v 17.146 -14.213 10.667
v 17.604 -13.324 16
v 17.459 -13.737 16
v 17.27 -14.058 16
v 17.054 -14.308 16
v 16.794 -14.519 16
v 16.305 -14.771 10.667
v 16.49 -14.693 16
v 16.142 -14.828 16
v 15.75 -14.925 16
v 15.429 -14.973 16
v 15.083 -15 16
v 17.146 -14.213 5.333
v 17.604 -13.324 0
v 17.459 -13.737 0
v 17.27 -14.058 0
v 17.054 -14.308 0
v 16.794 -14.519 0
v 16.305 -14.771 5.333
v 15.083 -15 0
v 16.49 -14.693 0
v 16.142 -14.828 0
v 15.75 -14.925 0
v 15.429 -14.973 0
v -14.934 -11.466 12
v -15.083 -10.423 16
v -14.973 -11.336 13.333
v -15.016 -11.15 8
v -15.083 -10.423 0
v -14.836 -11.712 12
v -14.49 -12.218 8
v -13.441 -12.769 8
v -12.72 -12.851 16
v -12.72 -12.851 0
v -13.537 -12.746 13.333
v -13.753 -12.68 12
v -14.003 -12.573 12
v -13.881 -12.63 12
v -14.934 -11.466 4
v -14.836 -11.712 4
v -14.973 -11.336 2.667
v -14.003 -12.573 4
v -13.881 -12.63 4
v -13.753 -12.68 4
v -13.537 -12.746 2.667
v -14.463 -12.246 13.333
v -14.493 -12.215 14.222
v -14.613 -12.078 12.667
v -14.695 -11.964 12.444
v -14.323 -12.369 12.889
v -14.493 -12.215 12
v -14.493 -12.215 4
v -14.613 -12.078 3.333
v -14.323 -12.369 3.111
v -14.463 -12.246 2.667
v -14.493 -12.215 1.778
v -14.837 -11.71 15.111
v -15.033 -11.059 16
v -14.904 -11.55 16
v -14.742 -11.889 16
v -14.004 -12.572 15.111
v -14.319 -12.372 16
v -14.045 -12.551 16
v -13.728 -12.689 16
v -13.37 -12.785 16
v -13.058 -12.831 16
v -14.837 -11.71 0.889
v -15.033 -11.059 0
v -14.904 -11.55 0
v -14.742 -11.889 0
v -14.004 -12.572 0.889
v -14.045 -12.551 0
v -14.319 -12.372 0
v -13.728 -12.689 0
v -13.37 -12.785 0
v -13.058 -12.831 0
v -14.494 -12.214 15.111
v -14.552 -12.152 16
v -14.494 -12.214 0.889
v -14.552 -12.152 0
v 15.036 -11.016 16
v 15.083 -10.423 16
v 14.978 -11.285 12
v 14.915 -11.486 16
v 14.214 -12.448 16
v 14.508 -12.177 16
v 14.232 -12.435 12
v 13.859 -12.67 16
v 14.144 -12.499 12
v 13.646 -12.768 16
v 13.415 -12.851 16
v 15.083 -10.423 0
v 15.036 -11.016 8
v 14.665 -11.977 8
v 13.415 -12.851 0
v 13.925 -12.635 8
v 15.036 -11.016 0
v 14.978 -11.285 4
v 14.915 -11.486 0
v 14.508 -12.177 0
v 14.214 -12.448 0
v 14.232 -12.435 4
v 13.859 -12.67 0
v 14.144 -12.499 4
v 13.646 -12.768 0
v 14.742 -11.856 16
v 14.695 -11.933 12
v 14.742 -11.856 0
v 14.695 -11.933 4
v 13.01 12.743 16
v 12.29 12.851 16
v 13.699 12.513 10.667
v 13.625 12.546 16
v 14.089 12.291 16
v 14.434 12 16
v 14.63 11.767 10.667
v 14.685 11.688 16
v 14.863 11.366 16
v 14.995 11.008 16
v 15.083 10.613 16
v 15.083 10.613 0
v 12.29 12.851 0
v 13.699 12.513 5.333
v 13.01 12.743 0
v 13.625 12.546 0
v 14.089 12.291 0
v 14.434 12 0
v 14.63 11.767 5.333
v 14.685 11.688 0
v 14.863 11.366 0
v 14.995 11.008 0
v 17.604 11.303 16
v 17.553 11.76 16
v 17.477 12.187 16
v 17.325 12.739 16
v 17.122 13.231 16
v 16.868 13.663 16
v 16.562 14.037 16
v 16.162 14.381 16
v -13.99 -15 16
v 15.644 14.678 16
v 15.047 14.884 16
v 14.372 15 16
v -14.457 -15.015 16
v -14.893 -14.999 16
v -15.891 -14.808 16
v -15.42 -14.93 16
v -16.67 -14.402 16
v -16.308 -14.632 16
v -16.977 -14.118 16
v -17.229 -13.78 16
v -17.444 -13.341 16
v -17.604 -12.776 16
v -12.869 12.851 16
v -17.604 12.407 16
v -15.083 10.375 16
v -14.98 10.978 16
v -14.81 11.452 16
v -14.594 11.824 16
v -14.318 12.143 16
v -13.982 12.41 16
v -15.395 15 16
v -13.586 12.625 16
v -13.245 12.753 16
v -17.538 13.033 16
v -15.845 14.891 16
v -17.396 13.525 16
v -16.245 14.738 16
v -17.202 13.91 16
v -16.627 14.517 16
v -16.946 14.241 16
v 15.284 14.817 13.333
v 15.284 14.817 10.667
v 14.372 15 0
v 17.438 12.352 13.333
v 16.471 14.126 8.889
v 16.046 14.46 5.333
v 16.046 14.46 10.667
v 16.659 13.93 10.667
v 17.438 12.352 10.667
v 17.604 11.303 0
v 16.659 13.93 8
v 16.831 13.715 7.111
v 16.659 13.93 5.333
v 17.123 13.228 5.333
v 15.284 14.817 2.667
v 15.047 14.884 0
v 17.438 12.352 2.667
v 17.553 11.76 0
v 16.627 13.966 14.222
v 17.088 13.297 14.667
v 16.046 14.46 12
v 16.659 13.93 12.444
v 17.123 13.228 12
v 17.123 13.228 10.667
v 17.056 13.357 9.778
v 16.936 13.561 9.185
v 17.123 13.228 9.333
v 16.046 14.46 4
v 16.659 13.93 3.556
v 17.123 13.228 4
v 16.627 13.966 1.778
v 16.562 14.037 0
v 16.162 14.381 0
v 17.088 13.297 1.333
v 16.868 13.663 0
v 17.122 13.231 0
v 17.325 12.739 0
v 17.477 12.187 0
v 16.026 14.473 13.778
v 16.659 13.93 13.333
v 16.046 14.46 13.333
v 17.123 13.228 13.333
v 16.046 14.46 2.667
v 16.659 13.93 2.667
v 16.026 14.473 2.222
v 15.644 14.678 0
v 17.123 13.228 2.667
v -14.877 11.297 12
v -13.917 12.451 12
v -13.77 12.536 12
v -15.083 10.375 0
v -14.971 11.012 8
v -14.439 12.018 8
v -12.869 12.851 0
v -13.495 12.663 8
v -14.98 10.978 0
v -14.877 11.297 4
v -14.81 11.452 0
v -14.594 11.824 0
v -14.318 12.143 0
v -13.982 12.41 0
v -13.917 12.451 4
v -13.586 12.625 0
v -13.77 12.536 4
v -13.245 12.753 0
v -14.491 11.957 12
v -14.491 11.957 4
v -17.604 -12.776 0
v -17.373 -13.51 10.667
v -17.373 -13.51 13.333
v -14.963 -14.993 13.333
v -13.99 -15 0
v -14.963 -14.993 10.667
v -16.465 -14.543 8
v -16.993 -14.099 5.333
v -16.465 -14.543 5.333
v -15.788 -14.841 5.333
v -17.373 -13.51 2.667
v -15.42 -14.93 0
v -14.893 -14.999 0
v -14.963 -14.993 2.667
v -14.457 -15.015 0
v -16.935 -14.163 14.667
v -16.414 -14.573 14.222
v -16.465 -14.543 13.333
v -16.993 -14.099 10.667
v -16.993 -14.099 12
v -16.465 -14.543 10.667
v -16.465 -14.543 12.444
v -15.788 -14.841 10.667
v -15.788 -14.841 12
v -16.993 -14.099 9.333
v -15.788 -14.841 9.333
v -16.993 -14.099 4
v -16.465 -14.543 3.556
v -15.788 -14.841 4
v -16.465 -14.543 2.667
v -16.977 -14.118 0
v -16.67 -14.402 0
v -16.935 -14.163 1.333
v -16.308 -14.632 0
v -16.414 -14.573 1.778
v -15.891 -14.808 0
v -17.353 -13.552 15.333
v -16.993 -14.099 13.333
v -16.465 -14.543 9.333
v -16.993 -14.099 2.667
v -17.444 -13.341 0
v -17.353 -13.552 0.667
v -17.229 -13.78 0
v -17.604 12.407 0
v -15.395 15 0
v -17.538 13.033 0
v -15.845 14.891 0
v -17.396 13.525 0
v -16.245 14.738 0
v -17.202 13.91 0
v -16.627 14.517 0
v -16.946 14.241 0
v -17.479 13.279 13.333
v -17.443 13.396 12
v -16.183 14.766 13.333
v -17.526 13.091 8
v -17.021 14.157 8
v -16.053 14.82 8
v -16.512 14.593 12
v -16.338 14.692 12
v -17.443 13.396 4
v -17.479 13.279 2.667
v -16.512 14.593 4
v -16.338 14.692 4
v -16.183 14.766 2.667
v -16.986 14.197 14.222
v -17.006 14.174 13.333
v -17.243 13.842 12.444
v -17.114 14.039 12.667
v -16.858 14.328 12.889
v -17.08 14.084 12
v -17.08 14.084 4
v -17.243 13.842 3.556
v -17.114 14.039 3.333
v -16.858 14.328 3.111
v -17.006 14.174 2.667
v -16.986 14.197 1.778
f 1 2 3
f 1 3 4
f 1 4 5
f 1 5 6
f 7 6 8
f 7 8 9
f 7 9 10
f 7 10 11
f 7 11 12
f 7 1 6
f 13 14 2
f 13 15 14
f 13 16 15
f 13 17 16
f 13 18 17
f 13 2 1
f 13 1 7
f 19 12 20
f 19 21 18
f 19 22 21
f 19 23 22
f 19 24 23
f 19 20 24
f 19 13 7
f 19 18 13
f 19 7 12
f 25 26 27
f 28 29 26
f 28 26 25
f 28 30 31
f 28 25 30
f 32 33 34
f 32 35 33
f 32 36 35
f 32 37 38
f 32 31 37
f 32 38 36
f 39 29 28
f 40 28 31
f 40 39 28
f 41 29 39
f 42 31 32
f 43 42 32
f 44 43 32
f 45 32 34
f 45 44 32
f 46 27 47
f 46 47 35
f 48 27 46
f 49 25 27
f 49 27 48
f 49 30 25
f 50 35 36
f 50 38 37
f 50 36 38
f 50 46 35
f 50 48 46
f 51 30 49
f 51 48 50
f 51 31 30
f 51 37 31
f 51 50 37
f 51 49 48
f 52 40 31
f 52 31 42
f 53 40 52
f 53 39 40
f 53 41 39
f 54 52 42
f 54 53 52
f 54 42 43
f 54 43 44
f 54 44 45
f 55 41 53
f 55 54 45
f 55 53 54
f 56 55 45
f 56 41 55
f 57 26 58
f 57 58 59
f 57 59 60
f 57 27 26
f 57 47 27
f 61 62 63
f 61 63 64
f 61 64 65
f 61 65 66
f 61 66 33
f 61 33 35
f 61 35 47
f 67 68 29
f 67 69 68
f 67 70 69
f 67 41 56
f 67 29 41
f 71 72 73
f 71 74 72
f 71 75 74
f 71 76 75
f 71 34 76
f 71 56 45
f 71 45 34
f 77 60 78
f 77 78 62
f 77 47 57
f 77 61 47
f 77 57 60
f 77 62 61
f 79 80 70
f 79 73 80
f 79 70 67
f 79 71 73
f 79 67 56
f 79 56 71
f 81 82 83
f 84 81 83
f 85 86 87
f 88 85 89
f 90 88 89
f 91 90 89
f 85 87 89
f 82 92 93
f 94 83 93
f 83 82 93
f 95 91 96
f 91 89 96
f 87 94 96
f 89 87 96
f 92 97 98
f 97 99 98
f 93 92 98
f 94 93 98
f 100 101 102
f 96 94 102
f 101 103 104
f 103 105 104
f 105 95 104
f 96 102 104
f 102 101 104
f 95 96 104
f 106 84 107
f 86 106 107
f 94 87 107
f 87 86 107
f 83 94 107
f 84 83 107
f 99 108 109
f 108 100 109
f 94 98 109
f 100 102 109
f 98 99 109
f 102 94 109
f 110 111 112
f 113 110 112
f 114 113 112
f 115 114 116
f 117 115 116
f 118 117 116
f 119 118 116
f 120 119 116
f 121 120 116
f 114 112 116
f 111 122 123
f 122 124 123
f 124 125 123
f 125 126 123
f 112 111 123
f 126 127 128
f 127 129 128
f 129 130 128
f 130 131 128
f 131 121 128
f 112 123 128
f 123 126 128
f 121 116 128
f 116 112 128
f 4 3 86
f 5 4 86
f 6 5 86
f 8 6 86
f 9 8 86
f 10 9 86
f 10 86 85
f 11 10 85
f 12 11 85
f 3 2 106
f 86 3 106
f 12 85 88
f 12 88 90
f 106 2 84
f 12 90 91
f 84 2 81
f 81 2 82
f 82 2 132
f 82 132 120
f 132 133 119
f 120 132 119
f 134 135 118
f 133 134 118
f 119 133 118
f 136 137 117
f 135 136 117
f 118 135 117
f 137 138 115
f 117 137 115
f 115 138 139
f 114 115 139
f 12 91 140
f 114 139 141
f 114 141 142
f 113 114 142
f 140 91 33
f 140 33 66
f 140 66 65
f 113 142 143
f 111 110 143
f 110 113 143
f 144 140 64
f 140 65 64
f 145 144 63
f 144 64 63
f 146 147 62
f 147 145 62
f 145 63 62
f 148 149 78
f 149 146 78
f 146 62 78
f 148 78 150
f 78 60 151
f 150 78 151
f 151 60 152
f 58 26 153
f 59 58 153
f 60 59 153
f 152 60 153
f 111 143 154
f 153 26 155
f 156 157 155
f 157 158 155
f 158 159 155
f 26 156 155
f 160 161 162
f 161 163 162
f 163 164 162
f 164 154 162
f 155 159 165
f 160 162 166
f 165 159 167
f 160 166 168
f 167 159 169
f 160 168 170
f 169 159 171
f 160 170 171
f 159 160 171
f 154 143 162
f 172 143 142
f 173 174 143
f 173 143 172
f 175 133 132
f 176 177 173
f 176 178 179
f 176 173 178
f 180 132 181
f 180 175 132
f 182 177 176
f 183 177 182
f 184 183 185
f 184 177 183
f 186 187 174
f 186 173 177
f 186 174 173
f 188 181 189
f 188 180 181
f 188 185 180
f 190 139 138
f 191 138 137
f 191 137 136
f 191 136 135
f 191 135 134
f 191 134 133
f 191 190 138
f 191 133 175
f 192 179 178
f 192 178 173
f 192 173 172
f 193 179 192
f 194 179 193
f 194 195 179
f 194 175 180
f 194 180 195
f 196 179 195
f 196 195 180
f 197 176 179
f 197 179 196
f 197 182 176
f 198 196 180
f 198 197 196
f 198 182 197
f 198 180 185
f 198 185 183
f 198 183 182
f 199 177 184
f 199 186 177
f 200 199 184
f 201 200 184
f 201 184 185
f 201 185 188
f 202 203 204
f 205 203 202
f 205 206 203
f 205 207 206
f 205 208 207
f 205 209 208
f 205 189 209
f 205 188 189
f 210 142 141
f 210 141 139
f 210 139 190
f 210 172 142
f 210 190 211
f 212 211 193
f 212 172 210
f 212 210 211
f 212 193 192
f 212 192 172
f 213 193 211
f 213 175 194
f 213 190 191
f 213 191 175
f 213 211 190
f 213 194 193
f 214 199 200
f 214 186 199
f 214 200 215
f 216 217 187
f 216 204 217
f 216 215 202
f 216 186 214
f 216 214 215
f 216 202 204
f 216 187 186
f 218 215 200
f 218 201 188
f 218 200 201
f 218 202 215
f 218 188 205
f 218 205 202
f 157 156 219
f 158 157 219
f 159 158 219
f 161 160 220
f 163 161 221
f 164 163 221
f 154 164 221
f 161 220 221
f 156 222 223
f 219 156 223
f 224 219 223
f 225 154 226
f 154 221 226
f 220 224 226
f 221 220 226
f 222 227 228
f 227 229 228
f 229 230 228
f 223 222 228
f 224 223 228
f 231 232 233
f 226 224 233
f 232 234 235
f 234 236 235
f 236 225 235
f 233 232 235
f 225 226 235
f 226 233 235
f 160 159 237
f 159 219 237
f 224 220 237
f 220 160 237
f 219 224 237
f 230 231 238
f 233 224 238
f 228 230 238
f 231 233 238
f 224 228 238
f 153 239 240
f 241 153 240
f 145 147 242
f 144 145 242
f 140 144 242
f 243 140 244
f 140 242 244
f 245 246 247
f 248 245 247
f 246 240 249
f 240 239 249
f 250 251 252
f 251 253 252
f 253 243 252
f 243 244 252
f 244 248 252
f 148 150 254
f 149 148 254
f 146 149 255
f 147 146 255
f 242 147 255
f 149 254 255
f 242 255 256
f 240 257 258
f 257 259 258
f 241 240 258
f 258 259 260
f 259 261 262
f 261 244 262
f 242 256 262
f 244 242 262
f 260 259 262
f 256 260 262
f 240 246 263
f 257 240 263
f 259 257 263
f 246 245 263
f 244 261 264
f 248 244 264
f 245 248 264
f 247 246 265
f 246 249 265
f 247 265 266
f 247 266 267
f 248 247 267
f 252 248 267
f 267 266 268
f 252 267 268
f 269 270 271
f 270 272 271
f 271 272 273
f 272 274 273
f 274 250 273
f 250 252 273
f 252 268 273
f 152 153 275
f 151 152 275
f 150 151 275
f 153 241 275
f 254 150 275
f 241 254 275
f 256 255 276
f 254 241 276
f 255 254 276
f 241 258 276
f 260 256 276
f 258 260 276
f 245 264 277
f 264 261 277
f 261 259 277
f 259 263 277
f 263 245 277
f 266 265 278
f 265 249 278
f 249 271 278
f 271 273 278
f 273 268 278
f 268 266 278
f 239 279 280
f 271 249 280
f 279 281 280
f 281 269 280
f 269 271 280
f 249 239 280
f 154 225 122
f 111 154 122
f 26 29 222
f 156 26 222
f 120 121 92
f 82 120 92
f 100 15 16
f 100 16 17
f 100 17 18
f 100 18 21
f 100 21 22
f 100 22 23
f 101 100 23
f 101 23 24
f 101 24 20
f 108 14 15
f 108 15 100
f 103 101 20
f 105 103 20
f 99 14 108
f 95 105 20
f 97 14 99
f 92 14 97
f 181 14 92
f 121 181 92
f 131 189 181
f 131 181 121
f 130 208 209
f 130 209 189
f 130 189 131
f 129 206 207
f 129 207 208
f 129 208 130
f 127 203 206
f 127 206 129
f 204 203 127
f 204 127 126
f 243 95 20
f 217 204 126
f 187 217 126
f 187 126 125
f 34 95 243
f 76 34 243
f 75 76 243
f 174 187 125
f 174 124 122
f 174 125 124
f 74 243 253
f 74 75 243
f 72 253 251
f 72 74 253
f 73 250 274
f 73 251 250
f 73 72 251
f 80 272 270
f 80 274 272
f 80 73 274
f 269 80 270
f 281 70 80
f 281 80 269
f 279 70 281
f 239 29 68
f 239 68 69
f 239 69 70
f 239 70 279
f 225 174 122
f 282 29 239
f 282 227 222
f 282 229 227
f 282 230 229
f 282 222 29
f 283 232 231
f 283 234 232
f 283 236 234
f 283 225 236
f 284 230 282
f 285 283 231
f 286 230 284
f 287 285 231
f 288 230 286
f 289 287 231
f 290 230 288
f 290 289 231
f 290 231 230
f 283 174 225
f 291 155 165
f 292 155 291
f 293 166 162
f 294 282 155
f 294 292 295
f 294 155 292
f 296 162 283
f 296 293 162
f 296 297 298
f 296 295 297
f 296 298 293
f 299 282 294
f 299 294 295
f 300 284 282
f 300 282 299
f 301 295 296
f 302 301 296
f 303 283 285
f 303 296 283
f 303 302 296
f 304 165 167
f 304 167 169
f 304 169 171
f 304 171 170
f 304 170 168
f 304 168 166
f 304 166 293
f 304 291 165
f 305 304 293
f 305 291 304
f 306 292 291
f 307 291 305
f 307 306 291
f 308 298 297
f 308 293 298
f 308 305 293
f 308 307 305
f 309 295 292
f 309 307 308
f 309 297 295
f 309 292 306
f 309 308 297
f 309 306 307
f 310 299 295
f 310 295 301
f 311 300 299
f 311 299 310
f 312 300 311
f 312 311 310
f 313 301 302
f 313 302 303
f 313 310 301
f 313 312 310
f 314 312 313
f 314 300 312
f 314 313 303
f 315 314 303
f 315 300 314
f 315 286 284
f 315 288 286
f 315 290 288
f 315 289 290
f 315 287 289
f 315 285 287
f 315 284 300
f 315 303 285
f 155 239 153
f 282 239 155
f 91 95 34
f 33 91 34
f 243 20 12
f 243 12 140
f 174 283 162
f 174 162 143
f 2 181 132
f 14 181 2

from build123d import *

# Parameters (mm, degrees)
BOSS_EXTRUDE4_DEPTH = 16


with BuildPart() as part:
    # Sketch3 → Boss-Extrude4 (new body)
    with BuildSketch(Plane.XY):
        with BuildLine():
            Line((-15.394959284, 15), (14.37206817, 15))
            add(Edge.make_bspline(
                [(14.37206817, 15), (16.344314338, 14.806153618), (17.421724303, 13.573948287), (17.604298066, 11.303384007)],
                knots=[0.157316623, 0.157316623, 0.157316623, 0.157316623, 1, 1, 1, 1], degree=3))
            Line((17.604298066, 11.303384007), (17.604298066, -13.324081778))
            add(Edge.make_bspline(
                [(17.604298066, -13.324081778), (17.337095636, -14.377577199), (16.496568016, -14.936216606), (15.082715206, -15)],
                knots=[0.317898453, 0.317898453, 0.317898453, 0.317898453, 1, 1, 1, 1], degree=3))
            Line((15.082715206, -15), (-13.989571853, -15))
            add(Edge.make_bspline(
                [(-17.604298066, -12.776063834), (-17.290256291, -14.390282227), (-16.085347553, -15.131594282), (-13.989571853, -15)],
                knots=[0.26063532, 0.26063532, 0.26063532, 0.26063532, 1, 1, 1, 1], degree=3))
            Line((-17.604298066, -12.776063834), (-17.604298066, 12.407487922))
            add(Edge.make_bspline(
                [(-17.604298066, 12.407487922), (-17.542065798, 14.610208227), (-15.394959284, 15)],
                knots=[0, 0, 0, 1, 1, 1], degree=2))
        make_face()
        with BuildLine():
            Line((-12.868921273, 12.851448393), (12.290353953, 12.851448393))
            add(Edge.make_bspline(
                [(12.290353953, 12.851448393), (13.937663202, 12.716565565), (14.868450289, 11.970465373), (15.082715212, 10.613147816)],
                knots=[0, 0, 0, 0, 0.769802432, 0.769802432, 0.769802432, 0.769802432], degree=3))
            Line((15.082715212, 10.613147816), (15.082715212, -10.422758289))
            add(Edge.make_bspline(
                [(15.082715212, -10.422758289), (15.08124759, -12.316637726), (13.415493999, -12.851448393)],
                knots=[0, 0, 0, 1, 1, 1], degree=2))
            Line((13.415493999, -12.851448393), (-12.720345322, -12.851448393))
            add(Edge.make_bspline(
                [(-15.082715206, -10.422758289), (-15.079137607, -12.799186037), (-12.720345322, -12.851448393)],
                knots=[0, 0, 0, 1, 1, 1], degree=2))
            Line((-15.082715206, -10.422758289), (-15.082715206, 10.375039522))
            add(Edge.make_bspline(
                [(-15.082715206, 10.375039522), (-14.901913362, 12.422179601), (-12.868921273, 12.851448393)],
                knots=[0, 0, 0, 1, 1, 1], degree=2))
        make_face(mode=Mode.SUBTRACT)
    extrude(amount=BOSS_EXTRUDE4_DEPTH)


solid = part.part
